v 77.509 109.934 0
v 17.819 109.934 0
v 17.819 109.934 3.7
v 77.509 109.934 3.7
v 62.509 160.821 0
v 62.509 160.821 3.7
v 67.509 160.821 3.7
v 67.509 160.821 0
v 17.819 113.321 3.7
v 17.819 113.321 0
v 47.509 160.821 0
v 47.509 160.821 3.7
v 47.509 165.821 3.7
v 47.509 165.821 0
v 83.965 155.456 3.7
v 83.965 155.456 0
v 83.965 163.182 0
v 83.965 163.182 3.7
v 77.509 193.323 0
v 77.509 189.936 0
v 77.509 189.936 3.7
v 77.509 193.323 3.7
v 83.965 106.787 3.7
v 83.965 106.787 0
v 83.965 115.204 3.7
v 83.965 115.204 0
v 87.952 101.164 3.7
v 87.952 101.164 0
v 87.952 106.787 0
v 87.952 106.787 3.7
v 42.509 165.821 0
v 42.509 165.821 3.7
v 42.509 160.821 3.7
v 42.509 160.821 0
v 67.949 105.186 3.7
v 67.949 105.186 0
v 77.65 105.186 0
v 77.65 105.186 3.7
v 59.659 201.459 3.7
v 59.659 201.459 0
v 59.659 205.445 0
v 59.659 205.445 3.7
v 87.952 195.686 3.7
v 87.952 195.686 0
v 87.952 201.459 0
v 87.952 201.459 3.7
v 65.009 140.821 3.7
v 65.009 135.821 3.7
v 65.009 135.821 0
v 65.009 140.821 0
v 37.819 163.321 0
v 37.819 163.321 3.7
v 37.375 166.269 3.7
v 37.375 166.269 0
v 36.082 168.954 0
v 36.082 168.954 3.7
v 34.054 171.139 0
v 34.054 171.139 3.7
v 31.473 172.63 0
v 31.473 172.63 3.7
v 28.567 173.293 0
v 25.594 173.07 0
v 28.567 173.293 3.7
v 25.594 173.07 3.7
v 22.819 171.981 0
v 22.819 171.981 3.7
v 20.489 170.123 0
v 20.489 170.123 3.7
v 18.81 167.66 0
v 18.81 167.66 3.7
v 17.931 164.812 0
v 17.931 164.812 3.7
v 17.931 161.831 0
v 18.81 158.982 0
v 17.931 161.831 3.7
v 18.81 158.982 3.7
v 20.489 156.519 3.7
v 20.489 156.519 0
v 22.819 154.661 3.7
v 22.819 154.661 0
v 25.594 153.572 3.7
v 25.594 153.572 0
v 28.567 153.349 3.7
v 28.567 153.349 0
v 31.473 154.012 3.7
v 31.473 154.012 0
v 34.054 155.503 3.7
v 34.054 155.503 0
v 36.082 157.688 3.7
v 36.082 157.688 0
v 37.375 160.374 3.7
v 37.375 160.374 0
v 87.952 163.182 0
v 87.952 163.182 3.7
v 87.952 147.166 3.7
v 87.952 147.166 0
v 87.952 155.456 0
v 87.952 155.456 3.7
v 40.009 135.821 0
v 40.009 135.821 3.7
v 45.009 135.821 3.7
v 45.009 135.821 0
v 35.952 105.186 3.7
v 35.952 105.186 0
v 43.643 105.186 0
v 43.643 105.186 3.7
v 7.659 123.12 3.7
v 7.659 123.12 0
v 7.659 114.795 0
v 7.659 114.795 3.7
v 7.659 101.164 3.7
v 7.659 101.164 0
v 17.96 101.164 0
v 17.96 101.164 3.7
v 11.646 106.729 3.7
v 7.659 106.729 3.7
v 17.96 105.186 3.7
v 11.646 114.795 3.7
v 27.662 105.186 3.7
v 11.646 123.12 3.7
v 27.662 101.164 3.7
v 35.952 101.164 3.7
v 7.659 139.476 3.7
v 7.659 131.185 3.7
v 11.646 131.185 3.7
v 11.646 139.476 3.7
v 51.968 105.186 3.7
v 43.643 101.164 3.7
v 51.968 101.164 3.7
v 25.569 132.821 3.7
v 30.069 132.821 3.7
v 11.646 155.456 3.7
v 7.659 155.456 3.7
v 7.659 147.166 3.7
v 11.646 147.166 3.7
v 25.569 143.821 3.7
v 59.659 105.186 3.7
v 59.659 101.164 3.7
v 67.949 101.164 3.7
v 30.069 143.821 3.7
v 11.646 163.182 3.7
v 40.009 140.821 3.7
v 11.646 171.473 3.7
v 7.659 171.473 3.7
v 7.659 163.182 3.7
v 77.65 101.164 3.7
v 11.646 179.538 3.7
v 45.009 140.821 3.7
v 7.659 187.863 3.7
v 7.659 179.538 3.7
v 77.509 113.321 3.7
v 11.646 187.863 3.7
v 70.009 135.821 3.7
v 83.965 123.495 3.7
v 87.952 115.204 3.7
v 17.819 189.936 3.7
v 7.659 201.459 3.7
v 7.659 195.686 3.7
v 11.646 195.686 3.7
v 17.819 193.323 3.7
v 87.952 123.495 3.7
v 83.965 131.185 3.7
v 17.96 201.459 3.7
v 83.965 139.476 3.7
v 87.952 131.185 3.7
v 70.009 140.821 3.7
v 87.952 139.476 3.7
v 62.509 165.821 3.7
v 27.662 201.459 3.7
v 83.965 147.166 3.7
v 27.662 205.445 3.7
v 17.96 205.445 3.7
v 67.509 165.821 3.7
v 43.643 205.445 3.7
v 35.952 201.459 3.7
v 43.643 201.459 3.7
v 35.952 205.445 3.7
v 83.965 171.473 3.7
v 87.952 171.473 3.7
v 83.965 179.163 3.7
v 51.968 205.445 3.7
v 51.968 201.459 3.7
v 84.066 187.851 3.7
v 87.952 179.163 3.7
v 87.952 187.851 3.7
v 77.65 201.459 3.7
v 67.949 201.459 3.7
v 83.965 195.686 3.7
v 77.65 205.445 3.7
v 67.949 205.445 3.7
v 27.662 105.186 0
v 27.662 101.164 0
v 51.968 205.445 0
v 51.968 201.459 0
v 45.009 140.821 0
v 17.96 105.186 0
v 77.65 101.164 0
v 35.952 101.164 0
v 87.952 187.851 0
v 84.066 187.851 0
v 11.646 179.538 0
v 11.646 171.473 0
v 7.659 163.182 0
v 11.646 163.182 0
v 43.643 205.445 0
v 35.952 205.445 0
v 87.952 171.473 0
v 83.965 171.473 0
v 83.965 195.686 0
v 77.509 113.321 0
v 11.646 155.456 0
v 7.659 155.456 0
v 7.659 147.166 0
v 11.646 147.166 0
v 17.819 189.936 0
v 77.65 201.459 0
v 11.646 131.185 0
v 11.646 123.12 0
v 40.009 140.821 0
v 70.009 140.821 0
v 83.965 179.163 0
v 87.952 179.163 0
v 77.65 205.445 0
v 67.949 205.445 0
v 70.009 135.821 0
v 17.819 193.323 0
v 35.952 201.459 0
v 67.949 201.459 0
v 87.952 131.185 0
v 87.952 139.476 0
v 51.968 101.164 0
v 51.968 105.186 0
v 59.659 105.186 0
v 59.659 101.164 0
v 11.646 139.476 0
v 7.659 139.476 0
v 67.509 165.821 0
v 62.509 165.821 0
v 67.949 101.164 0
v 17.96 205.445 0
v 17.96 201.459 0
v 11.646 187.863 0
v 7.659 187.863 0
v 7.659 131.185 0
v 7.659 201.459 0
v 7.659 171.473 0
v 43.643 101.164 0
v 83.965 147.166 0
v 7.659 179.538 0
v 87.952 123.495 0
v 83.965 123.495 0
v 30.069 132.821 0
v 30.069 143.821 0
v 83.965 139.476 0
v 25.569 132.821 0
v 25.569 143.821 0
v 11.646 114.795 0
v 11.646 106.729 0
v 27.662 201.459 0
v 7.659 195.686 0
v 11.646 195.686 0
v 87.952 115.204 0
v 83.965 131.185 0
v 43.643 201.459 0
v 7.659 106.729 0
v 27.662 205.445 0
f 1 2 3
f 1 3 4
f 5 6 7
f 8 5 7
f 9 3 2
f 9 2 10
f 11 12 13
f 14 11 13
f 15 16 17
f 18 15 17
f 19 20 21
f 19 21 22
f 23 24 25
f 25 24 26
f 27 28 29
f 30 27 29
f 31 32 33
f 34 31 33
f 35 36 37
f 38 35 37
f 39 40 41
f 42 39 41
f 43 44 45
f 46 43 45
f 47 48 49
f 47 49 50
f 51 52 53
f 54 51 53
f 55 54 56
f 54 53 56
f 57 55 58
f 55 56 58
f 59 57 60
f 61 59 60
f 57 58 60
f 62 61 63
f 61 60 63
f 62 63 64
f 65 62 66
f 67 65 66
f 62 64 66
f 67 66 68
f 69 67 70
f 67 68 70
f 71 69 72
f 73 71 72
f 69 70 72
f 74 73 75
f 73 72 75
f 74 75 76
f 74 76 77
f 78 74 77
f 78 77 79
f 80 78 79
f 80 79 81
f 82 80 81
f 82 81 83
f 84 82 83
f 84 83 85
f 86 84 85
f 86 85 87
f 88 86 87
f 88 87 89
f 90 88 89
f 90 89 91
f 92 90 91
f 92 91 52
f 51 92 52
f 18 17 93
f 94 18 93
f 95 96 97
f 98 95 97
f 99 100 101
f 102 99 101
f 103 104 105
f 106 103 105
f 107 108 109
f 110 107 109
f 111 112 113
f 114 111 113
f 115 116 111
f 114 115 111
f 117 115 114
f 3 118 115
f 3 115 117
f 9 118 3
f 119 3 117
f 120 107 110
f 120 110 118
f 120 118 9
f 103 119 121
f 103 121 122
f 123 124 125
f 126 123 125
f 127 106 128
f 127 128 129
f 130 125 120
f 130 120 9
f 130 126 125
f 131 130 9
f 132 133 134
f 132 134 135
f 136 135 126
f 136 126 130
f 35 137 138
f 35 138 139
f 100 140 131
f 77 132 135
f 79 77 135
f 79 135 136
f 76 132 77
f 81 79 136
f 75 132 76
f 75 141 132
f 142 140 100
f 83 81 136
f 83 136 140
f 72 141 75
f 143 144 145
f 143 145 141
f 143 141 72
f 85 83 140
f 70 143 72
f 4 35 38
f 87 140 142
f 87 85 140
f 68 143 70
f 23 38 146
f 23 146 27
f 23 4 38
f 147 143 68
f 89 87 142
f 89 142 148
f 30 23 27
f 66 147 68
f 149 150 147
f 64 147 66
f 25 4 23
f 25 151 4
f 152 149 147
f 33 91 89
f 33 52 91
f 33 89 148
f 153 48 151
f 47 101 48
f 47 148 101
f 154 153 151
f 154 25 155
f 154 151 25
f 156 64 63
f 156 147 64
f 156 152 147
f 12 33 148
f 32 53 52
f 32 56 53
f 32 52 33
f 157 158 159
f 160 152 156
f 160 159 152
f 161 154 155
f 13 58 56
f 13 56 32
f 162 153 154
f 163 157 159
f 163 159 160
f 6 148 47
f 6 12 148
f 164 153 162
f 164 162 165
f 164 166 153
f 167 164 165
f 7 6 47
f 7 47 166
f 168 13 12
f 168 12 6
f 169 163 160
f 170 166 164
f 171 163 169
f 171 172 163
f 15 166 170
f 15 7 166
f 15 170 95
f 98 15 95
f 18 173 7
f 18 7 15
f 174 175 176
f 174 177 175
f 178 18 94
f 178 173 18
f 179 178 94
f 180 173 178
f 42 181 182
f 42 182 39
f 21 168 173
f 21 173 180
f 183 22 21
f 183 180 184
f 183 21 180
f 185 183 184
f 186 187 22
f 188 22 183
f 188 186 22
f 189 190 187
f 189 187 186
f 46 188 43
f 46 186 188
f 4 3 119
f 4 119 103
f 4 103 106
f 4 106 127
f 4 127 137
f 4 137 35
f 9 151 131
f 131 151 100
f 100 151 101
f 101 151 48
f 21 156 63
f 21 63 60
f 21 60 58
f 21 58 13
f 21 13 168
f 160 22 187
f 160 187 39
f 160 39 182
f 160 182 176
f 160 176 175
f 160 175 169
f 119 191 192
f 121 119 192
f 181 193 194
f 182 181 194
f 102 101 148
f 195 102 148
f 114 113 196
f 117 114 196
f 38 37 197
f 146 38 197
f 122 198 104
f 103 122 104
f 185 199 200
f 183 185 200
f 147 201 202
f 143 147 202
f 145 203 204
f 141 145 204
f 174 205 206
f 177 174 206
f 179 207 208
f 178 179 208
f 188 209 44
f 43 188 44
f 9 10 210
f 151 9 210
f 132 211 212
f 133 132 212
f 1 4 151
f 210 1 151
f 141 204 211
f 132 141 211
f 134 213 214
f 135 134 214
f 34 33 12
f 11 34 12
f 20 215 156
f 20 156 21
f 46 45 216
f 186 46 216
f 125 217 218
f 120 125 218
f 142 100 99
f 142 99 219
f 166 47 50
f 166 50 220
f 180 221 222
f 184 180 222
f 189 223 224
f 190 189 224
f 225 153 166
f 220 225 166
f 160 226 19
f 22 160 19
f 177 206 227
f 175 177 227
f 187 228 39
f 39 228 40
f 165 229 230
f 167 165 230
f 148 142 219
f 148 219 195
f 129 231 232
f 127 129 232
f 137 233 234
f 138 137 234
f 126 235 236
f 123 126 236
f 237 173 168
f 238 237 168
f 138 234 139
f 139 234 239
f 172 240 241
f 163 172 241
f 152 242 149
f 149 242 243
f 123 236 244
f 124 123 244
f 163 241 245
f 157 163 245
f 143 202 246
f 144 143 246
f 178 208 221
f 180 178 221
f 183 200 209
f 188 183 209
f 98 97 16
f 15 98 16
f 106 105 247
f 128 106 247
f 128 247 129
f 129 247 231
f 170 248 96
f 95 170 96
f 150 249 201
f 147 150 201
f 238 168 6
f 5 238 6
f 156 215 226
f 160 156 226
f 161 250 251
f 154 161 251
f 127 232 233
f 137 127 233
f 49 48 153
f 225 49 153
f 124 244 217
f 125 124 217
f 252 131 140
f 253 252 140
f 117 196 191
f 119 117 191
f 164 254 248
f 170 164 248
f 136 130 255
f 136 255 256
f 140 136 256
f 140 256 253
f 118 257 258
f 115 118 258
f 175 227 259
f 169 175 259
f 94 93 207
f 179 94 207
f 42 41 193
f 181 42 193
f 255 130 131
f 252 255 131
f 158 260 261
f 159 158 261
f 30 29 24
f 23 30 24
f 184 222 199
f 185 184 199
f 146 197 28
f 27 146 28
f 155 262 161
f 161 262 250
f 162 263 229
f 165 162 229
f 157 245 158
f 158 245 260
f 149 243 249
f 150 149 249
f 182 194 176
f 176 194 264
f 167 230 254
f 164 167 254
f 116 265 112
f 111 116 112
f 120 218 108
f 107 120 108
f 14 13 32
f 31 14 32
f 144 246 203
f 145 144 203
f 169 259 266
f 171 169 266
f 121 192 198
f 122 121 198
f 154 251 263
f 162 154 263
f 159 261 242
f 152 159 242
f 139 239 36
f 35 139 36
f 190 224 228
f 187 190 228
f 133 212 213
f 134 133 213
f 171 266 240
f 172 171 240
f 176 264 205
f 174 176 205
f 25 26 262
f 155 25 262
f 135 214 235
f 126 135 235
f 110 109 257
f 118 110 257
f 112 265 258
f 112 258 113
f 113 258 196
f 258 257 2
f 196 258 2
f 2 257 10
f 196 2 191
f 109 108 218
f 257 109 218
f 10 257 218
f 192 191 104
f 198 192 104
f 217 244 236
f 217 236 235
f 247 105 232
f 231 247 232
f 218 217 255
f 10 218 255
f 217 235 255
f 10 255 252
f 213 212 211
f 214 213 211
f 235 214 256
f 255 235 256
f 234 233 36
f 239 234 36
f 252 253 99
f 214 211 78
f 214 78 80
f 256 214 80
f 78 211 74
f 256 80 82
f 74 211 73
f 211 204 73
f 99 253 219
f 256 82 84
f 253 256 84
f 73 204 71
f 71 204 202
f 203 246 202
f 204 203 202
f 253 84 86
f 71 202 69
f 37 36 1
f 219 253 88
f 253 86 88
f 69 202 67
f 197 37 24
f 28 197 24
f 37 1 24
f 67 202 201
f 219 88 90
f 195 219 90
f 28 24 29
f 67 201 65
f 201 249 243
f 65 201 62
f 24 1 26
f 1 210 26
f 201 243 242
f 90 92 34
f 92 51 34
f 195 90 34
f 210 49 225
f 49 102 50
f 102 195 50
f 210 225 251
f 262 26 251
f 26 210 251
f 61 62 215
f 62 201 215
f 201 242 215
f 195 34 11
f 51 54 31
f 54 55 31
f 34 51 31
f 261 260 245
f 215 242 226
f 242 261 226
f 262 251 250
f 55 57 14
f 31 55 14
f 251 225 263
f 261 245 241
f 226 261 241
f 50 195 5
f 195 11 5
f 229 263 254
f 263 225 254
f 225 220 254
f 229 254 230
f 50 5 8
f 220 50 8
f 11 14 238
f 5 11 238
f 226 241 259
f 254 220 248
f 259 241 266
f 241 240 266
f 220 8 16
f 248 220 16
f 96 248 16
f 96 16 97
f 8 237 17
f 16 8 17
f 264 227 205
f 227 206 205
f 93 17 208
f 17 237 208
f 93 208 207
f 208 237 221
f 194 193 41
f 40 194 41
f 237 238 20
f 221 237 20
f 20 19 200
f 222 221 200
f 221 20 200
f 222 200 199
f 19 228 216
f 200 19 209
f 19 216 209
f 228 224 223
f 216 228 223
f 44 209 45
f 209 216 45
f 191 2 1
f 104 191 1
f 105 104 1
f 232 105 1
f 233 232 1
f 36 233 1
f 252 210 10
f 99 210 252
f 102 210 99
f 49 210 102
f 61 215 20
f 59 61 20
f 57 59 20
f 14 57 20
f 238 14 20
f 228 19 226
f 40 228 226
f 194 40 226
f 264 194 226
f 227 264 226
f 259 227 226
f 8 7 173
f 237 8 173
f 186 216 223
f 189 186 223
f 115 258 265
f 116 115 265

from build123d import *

# Parameters (mm, degrees)
MODEL_W             = 59.689998908
MODEL_H             = 3.386668819
MODEL_H_2           = 3.3866668
BOSS_EXTRUDE1_DEPTH = 3.7
SKETCH1_W           = 5
SKETCH1_H           = 5
SKETCH1_R           = 10
SKETCH1_W_2         = 4.5
SKETCH1_H_2         = 11
CUT_EXTRUDE1_DEPTH  = 10


with BuildPart() as part:
    # Model → Boss-Extrude1 (new body)
    with BuildSketch(Plane.XY):
        Polygon((7.659321824, 131.185313162), (11.645711781, 131.185313467), (11.645711781, 123.120135193), (7.659323163, 123.120135799), (7.659323163, 114.794580784), (11.645711704, 114.794580995), (11.645711704, 106.729402721), (7.659323085, 106.729402721), (7.659322496, 101.163927511), (17.960431856, 101.163927511), (17.960431856, 105.185592023), (27.661820742, 105.185592023), (27.661820742, 101.163927511), (35.952098518, 101.163927511), (35.952098518, 105.185592023), (43.642655148, 105.185592023), (43.642655148, 101.163927511), (51.968212855, 101.163927511), (51.968212855, 105.185592023), (59.658766793, 105.185592023), (59.658766793, 101.163927511), (67.949044569, 101.163927511), (67.949044569, 105.185592023), (77.650433456, 105.185592023), (77.650433456, 101.163927511), (87.951545673, 101.163927511), (87.951545673, 106.78652537), (83.965155709, 106.78652537), (83.965155709, 115.20447842), (87.951545673, 115.204478756), (87.951545673, 123.494756532), (83.965155708, 123.494756532), (83.965155708, 131.185313162), (87.951545168, 131.185313162), (87.951545168, 139.475590938), (83.965156213, 139.475590938), (83.965156213, 147.166147568), (87.951545168, 147.166147568), (87.951545168, 155.456425344), (83.965156213, 155.456425344), (83.965156213, 163.182259213), (87.951545168, 163.182259213), (87.951545168, 171.472536989), (83.965156213, 171.472536989), (83.965156213, 179.163092274), (87.951545169, 179.163092274), (87.951545169, 187.851347209), (84.066213746, 187.851347204), (83.965155204, 195.685953684), (87.951545169, 195.685953684), (87.951544665, 201.458647414), (77.650433455, 201.458647414), (77.650433455, 205.445036033), (67.949044569, 205.445036033), (67.949044569, 201.458647414), (59.658766793, 201.458647414), (59.658766793, 205.445036033), (51.968212854, 205.445036033), (51.968212854, 201.458647414), (43.642655148, 201.458647414), (43.642655148, 205.445036033), (35.952098517, 205.445036033), (35.952098517, 201.458647414), (27.661820742, 201.458647414), (27.661820742, 205.445036033), (17.960431855, 205.445036033), (17.960431855, 201.458647414), (7.659323162, 201.458647414), (7.659321865, 195.685953684), (11.645710483, 195.685953684), (11.645711788, 187.863269672), (7.65932317, 187.863269672), (7.65932317, 179.537714657), (11.645711788, 179.537715263), (11.645711788, 171.472536989), (7.659321824, 171.472536989), (7.659321824, 163.182259214), (11.645711789, 163.182259214), (11.645711789, 155.456425344), (7.659321824, 155.456425344), (7.659321824, 147.166147568), (11.645711789, 147.166147568), (11.645711789, 139.475590938), (7.659321824, 139.475590938), align=None)
        with Locations((47.664322352, 111.627811013)):
            Rectangle(MODEL_W, MODEL_H, mode=Mode.SUBTRACT)
        with Locations((47.664322352, 191.629758602)):
            Rectangle(MODEL_W, MODEL_H_2, mode=Mode.SUBTRACT)
    extrude(amount=BOSS_EXTRUDE1_DEPTH)

    # Sketch1 → Cut-Extrude1 (cut)
    with BuildSketch(Plane.XY.offset(3.7)):
        with Locations((42.509321806, 138.321145422)):
            Rectangle(SKETCH1_W, SKETCH1_H)
        Polygon((47.509321806, 160.821145422), (47.509321806, 163.321145422), (47.509321806, 165.821145422), (42.509321806, 165.821145422), (42.509321806, 160.821145422), align=None)
        Polygon((62.509321806, 165.821145422), (62.509321806, 163.321145422), (62.509321806, 160.821145422), (67.509321806, 160.821145422), (67.509321806, 165.821145422), align=None)
        with Locations((67.509321806, 138.321145422)):
            Rectangle(SKETCH1_W, SKETCH1_H)
        with Locations((27.819322898, 163.321145422)):
            Circle(SKETCH1_R)
        with Locations((27.819322898, 138.321145422)):
            Rectangle(SKETCH1_W_2, SKETCH1_H_2)
    extrude(amount=-CUT_EXTRUDE1_DEPTH, mode=Mode.SUBTRACT)


solid = part.part
